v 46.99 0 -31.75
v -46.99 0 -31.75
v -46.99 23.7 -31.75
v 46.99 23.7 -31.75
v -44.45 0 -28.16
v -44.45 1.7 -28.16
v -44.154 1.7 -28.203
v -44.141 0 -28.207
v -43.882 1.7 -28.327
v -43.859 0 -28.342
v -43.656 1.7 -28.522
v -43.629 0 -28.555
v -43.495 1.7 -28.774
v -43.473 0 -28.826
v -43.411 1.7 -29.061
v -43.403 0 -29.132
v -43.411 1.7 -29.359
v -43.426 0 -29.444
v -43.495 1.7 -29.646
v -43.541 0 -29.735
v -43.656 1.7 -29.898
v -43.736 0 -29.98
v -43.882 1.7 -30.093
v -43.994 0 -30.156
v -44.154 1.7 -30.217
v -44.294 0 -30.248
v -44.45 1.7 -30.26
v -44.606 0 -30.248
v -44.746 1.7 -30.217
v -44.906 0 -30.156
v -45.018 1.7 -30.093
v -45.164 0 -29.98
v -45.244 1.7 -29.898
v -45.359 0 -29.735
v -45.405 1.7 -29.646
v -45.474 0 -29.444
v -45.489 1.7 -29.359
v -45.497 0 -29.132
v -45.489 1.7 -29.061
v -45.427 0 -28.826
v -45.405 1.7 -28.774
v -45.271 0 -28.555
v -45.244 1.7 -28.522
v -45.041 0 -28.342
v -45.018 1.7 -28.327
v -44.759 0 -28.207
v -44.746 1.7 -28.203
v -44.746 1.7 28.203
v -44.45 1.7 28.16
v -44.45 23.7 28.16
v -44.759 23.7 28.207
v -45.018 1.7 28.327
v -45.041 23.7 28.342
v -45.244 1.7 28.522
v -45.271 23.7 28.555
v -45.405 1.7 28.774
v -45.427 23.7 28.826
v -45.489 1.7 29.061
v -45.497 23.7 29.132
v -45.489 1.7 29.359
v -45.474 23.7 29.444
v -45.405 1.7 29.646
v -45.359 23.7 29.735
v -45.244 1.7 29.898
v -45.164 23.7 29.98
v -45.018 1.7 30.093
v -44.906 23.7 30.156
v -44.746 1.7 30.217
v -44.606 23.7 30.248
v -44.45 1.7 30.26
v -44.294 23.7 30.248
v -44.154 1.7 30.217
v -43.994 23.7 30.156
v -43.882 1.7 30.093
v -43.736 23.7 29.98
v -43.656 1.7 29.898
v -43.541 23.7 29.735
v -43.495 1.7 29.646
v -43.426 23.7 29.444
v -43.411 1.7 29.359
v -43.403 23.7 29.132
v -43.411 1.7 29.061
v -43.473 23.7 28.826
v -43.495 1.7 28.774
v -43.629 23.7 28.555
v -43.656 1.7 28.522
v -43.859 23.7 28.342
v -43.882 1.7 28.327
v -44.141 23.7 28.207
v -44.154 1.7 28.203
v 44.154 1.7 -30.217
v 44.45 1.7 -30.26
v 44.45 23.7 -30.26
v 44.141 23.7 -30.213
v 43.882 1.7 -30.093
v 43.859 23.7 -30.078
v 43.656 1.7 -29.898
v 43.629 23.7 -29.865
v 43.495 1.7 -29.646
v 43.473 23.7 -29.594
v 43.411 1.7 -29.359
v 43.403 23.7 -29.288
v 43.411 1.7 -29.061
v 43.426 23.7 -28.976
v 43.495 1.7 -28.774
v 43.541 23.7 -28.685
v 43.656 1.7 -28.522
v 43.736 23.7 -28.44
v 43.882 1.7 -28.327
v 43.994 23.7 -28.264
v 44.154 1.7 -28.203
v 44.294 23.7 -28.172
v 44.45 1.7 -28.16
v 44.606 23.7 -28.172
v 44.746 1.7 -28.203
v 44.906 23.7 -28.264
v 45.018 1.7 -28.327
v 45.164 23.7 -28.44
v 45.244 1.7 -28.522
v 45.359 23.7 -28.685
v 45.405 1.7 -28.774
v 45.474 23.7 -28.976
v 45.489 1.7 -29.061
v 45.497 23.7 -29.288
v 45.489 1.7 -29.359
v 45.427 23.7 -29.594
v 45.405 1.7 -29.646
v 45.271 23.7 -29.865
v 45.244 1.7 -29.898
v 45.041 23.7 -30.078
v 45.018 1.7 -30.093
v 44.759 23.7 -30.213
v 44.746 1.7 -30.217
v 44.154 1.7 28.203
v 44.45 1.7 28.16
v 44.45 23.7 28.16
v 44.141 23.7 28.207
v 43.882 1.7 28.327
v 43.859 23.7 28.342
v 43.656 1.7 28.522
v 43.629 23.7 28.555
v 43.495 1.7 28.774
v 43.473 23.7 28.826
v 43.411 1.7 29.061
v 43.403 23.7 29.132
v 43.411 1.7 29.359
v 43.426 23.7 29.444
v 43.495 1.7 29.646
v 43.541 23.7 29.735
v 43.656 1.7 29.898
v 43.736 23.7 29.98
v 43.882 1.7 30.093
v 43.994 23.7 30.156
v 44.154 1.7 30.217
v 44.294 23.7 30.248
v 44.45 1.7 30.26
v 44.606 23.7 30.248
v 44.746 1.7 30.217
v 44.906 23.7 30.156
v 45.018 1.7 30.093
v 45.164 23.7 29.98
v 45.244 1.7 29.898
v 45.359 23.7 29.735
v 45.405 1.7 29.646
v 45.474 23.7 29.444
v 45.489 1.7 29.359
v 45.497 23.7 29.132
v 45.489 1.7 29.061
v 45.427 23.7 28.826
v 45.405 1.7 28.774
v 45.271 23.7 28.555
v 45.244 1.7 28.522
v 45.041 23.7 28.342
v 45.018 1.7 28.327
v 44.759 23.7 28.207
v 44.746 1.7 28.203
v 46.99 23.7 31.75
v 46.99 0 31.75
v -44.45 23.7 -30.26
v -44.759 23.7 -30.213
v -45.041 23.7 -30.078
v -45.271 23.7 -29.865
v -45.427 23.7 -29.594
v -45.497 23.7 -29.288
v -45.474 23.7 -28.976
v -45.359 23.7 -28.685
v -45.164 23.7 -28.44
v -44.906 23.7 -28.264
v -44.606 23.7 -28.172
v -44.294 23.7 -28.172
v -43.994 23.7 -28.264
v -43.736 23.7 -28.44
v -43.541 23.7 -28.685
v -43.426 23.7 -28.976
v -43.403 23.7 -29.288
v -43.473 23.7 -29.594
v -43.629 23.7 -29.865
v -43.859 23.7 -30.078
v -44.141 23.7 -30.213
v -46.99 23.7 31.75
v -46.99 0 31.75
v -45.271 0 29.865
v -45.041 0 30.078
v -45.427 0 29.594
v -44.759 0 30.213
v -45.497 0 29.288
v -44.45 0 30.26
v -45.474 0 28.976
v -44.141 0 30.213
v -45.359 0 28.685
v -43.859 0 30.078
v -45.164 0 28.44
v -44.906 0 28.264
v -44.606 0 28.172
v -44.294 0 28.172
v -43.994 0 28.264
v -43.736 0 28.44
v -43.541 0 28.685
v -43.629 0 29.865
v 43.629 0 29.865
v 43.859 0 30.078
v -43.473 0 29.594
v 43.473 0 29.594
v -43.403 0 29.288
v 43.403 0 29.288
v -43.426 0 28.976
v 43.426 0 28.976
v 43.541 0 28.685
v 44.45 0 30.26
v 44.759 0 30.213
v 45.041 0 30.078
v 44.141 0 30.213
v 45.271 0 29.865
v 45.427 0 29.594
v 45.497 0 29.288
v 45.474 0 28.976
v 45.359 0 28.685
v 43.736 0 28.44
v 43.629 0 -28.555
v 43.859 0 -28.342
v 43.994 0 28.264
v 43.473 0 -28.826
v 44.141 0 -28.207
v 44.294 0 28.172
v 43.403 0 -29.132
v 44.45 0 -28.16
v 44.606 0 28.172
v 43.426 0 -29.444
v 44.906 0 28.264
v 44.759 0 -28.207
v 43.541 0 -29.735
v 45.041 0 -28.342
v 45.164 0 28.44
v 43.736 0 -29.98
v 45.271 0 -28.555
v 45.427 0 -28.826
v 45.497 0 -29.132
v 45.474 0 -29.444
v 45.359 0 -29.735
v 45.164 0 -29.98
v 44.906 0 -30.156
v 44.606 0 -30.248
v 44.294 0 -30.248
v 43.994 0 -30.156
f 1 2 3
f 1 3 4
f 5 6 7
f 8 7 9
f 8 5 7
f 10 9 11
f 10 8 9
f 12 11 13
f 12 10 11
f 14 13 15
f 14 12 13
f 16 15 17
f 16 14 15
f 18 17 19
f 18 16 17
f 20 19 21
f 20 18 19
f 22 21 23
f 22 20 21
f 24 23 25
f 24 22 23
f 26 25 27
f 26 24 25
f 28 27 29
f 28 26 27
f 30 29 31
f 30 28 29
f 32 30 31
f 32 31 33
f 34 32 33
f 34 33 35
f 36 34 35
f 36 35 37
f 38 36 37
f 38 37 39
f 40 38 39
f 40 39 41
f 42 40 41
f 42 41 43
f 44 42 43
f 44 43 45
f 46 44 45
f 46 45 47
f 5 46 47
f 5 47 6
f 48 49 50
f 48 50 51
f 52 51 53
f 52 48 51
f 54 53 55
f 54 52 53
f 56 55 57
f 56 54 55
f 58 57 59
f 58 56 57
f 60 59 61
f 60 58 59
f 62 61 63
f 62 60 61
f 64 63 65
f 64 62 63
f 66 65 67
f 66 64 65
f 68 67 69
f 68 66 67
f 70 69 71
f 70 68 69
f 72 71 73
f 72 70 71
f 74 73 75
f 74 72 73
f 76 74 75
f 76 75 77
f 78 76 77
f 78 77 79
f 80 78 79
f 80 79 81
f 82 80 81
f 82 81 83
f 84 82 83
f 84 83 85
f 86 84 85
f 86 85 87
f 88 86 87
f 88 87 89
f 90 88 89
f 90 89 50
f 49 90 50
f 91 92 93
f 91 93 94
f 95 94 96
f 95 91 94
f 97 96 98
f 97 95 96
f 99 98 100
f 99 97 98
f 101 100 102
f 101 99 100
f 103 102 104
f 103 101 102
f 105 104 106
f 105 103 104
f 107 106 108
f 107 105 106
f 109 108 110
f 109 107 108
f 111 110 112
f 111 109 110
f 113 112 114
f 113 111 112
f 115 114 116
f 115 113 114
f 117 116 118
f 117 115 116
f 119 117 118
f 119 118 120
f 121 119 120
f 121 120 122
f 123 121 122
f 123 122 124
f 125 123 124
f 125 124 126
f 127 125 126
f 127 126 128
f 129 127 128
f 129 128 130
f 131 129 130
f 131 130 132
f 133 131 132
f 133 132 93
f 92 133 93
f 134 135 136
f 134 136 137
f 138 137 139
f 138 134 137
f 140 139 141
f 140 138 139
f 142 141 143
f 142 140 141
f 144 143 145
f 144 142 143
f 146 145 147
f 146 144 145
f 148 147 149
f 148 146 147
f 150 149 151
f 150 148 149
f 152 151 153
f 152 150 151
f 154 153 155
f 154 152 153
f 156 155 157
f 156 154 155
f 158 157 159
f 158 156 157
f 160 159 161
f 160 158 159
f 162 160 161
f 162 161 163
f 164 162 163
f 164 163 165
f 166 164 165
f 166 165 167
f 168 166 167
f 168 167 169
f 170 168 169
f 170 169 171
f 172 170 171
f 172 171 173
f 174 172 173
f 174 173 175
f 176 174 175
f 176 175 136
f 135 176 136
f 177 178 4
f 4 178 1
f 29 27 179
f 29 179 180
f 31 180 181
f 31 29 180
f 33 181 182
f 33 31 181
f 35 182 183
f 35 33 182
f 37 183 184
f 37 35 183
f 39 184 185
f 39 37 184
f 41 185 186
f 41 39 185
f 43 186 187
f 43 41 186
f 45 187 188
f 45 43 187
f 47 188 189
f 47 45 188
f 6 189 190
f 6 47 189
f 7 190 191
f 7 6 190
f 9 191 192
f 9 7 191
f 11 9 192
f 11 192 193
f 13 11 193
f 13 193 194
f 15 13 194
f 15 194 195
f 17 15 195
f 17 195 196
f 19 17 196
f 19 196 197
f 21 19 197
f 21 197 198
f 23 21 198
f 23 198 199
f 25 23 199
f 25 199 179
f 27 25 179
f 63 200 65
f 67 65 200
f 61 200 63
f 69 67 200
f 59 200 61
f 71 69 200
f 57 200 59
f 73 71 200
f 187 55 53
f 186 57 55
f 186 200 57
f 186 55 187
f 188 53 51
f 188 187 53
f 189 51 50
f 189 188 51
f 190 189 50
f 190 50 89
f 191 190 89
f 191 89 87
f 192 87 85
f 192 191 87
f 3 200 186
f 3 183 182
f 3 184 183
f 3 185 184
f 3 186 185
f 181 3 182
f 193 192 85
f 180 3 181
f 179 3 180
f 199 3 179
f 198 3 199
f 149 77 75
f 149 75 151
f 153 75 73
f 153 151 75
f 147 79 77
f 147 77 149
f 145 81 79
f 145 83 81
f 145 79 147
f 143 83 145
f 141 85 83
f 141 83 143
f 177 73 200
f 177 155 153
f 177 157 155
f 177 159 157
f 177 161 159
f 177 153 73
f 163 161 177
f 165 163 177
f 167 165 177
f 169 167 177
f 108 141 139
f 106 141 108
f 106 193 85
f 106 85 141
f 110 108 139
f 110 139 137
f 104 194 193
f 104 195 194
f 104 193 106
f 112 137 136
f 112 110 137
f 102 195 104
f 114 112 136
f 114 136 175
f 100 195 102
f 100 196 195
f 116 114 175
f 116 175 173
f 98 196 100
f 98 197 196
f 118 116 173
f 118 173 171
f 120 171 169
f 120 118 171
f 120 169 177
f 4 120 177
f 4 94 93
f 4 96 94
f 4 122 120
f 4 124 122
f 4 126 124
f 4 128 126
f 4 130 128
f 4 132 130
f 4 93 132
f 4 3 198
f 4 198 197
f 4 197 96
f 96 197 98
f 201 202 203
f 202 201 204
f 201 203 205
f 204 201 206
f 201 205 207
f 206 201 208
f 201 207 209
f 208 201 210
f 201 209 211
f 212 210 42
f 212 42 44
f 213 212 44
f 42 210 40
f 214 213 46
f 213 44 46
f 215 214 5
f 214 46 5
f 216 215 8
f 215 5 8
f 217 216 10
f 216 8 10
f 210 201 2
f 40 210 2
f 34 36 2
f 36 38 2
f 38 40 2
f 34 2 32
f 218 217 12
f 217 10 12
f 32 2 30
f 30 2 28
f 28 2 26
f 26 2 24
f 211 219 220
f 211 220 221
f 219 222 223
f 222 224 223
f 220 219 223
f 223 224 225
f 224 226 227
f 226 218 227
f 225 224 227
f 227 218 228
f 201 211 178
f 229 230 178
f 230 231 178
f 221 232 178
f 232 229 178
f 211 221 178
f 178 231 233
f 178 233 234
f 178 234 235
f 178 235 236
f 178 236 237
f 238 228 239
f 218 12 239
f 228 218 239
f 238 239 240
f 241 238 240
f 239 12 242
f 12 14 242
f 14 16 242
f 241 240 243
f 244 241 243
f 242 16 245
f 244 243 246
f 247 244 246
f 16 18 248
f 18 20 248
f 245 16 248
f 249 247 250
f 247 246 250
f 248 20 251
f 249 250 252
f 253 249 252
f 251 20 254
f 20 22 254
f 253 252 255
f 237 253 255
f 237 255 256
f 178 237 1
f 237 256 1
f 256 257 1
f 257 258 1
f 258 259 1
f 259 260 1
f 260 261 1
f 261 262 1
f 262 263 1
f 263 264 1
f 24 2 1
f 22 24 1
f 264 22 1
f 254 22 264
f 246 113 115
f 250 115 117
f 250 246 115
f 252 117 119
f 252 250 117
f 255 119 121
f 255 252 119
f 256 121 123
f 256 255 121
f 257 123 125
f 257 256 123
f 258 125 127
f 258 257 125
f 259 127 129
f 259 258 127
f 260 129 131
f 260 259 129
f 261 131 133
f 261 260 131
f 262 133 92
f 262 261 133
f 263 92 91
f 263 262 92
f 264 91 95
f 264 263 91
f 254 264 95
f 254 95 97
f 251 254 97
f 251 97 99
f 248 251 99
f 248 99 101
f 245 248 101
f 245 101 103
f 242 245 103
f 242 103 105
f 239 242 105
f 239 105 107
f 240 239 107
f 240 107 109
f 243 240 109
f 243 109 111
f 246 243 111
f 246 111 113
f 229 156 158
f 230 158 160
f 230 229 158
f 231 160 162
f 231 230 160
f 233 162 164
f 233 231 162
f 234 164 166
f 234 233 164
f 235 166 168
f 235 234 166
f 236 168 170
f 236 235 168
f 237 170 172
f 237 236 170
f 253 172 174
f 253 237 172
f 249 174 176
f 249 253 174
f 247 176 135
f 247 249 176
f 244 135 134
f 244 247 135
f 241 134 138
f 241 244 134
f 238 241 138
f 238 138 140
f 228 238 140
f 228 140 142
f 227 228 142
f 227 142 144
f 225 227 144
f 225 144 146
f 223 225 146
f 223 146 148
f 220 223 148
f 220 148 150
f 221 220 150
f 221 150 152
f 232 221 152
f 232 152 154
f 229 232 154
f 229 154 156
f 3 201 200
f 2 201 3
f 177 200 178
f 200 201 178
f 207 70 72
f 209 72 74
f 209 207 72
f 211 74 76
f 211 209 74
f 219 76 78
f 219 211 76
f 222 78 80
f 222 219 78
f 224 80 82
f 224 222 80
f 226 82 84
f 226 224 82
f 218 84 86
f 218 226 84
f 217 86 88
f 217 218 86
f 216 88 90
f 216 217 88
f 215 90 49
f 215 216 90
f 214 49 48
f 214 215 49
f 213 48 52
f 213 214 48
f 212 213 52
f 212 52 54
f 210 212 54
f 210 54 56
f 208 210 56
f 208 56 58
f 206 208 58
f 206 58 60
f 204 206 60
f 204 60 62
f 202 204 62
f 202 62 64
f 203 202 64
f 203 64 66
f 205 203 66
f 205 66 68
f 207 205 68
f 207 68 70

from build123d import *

# Parameters (mm, degrees)
SKETCH_1_W      = 93.98
SKETCH_1_H      = 63.5
SKETCH_1_R      = 1.05
EXTRUDE_1_DEPTH = 1.7
EXTRUDE_START   = 1.7
SKETCH_1_4_W    = 93.98
SKETCH_1_4_H    = 63.5
SKETCH_1_4_R    = 1.05
EXTRUDE_2_DEPTH = 22


with BuildPart() as part:
    # 草图1 → 凸台-拉伸1 (new body)
    with BuildSketch(Plane(origin=(0, 0, 0), x_dir=(1, 0, 0), z_dir=(0, 1, 0))):
        Rectangle(SKETCH_1_W, SKETCH_1_H)
        with Locations(Location((-44.45, 29.21, 0), (0, 0, 270))):
            Circle(SKETCH_1_R, mode=Mode.SUBTRACT)
        with Locations(Location((-44.45, -29.21, 0), (0, 0, 270))):
            Circle(SKETCH_1_R, mode=Mode.SUBTRACT)
        with Locations(Location((44.45, 29.21, 0), (0, 0, 270))):
            Circle(SKETCH_1_R, mode=Mode.SUBTRACT)
        with Locations(Location((44.45, -29.21, 0), (0, 0, 270))):
            Circle(SKETCH_1_R, mode=Mode.SUBTRACT)
    extrude(amount=EXTRUDE_1_DEPTH)

    # 草图1<4> → 凸台-拉伸2 (add)
    with BuildSketch(Plane(origin=(0, 0, 0), x_dir=(1, 0, 0), z_dir=(0, 1, 0)).offset(EXTRUDE_START)):
        Rectangle(SKETCH_1_4_W, SKETCH_1_4_H)
        with Locations(Location((-44.45, 29.21, 0), (0, 0, 90))):
            Circle(SKETCH_1_4_R, mode=Mode.SUBTRACT)
        with Locations(Location((-44.45, -29.21, 0), (0, 0, 90))):
            Circle(SKETCH_1_4_R, mode=Mode.SUBTRACT)
        with Locations(Location((44.45, 29.21, 0), (0, 0, 90))):
            Circle(SKETCH_1_4_R, mode=Mode.SUBTRACT)
        with Locations(Location((44.45, -29.21, 0), (0, 0, 90))):
            Circle(SKETCH_1_4_R, mode=Mode.SUBTRACT)
    extrude(amount=EXTRUDE_2_DEPTH)


solid = part.part
